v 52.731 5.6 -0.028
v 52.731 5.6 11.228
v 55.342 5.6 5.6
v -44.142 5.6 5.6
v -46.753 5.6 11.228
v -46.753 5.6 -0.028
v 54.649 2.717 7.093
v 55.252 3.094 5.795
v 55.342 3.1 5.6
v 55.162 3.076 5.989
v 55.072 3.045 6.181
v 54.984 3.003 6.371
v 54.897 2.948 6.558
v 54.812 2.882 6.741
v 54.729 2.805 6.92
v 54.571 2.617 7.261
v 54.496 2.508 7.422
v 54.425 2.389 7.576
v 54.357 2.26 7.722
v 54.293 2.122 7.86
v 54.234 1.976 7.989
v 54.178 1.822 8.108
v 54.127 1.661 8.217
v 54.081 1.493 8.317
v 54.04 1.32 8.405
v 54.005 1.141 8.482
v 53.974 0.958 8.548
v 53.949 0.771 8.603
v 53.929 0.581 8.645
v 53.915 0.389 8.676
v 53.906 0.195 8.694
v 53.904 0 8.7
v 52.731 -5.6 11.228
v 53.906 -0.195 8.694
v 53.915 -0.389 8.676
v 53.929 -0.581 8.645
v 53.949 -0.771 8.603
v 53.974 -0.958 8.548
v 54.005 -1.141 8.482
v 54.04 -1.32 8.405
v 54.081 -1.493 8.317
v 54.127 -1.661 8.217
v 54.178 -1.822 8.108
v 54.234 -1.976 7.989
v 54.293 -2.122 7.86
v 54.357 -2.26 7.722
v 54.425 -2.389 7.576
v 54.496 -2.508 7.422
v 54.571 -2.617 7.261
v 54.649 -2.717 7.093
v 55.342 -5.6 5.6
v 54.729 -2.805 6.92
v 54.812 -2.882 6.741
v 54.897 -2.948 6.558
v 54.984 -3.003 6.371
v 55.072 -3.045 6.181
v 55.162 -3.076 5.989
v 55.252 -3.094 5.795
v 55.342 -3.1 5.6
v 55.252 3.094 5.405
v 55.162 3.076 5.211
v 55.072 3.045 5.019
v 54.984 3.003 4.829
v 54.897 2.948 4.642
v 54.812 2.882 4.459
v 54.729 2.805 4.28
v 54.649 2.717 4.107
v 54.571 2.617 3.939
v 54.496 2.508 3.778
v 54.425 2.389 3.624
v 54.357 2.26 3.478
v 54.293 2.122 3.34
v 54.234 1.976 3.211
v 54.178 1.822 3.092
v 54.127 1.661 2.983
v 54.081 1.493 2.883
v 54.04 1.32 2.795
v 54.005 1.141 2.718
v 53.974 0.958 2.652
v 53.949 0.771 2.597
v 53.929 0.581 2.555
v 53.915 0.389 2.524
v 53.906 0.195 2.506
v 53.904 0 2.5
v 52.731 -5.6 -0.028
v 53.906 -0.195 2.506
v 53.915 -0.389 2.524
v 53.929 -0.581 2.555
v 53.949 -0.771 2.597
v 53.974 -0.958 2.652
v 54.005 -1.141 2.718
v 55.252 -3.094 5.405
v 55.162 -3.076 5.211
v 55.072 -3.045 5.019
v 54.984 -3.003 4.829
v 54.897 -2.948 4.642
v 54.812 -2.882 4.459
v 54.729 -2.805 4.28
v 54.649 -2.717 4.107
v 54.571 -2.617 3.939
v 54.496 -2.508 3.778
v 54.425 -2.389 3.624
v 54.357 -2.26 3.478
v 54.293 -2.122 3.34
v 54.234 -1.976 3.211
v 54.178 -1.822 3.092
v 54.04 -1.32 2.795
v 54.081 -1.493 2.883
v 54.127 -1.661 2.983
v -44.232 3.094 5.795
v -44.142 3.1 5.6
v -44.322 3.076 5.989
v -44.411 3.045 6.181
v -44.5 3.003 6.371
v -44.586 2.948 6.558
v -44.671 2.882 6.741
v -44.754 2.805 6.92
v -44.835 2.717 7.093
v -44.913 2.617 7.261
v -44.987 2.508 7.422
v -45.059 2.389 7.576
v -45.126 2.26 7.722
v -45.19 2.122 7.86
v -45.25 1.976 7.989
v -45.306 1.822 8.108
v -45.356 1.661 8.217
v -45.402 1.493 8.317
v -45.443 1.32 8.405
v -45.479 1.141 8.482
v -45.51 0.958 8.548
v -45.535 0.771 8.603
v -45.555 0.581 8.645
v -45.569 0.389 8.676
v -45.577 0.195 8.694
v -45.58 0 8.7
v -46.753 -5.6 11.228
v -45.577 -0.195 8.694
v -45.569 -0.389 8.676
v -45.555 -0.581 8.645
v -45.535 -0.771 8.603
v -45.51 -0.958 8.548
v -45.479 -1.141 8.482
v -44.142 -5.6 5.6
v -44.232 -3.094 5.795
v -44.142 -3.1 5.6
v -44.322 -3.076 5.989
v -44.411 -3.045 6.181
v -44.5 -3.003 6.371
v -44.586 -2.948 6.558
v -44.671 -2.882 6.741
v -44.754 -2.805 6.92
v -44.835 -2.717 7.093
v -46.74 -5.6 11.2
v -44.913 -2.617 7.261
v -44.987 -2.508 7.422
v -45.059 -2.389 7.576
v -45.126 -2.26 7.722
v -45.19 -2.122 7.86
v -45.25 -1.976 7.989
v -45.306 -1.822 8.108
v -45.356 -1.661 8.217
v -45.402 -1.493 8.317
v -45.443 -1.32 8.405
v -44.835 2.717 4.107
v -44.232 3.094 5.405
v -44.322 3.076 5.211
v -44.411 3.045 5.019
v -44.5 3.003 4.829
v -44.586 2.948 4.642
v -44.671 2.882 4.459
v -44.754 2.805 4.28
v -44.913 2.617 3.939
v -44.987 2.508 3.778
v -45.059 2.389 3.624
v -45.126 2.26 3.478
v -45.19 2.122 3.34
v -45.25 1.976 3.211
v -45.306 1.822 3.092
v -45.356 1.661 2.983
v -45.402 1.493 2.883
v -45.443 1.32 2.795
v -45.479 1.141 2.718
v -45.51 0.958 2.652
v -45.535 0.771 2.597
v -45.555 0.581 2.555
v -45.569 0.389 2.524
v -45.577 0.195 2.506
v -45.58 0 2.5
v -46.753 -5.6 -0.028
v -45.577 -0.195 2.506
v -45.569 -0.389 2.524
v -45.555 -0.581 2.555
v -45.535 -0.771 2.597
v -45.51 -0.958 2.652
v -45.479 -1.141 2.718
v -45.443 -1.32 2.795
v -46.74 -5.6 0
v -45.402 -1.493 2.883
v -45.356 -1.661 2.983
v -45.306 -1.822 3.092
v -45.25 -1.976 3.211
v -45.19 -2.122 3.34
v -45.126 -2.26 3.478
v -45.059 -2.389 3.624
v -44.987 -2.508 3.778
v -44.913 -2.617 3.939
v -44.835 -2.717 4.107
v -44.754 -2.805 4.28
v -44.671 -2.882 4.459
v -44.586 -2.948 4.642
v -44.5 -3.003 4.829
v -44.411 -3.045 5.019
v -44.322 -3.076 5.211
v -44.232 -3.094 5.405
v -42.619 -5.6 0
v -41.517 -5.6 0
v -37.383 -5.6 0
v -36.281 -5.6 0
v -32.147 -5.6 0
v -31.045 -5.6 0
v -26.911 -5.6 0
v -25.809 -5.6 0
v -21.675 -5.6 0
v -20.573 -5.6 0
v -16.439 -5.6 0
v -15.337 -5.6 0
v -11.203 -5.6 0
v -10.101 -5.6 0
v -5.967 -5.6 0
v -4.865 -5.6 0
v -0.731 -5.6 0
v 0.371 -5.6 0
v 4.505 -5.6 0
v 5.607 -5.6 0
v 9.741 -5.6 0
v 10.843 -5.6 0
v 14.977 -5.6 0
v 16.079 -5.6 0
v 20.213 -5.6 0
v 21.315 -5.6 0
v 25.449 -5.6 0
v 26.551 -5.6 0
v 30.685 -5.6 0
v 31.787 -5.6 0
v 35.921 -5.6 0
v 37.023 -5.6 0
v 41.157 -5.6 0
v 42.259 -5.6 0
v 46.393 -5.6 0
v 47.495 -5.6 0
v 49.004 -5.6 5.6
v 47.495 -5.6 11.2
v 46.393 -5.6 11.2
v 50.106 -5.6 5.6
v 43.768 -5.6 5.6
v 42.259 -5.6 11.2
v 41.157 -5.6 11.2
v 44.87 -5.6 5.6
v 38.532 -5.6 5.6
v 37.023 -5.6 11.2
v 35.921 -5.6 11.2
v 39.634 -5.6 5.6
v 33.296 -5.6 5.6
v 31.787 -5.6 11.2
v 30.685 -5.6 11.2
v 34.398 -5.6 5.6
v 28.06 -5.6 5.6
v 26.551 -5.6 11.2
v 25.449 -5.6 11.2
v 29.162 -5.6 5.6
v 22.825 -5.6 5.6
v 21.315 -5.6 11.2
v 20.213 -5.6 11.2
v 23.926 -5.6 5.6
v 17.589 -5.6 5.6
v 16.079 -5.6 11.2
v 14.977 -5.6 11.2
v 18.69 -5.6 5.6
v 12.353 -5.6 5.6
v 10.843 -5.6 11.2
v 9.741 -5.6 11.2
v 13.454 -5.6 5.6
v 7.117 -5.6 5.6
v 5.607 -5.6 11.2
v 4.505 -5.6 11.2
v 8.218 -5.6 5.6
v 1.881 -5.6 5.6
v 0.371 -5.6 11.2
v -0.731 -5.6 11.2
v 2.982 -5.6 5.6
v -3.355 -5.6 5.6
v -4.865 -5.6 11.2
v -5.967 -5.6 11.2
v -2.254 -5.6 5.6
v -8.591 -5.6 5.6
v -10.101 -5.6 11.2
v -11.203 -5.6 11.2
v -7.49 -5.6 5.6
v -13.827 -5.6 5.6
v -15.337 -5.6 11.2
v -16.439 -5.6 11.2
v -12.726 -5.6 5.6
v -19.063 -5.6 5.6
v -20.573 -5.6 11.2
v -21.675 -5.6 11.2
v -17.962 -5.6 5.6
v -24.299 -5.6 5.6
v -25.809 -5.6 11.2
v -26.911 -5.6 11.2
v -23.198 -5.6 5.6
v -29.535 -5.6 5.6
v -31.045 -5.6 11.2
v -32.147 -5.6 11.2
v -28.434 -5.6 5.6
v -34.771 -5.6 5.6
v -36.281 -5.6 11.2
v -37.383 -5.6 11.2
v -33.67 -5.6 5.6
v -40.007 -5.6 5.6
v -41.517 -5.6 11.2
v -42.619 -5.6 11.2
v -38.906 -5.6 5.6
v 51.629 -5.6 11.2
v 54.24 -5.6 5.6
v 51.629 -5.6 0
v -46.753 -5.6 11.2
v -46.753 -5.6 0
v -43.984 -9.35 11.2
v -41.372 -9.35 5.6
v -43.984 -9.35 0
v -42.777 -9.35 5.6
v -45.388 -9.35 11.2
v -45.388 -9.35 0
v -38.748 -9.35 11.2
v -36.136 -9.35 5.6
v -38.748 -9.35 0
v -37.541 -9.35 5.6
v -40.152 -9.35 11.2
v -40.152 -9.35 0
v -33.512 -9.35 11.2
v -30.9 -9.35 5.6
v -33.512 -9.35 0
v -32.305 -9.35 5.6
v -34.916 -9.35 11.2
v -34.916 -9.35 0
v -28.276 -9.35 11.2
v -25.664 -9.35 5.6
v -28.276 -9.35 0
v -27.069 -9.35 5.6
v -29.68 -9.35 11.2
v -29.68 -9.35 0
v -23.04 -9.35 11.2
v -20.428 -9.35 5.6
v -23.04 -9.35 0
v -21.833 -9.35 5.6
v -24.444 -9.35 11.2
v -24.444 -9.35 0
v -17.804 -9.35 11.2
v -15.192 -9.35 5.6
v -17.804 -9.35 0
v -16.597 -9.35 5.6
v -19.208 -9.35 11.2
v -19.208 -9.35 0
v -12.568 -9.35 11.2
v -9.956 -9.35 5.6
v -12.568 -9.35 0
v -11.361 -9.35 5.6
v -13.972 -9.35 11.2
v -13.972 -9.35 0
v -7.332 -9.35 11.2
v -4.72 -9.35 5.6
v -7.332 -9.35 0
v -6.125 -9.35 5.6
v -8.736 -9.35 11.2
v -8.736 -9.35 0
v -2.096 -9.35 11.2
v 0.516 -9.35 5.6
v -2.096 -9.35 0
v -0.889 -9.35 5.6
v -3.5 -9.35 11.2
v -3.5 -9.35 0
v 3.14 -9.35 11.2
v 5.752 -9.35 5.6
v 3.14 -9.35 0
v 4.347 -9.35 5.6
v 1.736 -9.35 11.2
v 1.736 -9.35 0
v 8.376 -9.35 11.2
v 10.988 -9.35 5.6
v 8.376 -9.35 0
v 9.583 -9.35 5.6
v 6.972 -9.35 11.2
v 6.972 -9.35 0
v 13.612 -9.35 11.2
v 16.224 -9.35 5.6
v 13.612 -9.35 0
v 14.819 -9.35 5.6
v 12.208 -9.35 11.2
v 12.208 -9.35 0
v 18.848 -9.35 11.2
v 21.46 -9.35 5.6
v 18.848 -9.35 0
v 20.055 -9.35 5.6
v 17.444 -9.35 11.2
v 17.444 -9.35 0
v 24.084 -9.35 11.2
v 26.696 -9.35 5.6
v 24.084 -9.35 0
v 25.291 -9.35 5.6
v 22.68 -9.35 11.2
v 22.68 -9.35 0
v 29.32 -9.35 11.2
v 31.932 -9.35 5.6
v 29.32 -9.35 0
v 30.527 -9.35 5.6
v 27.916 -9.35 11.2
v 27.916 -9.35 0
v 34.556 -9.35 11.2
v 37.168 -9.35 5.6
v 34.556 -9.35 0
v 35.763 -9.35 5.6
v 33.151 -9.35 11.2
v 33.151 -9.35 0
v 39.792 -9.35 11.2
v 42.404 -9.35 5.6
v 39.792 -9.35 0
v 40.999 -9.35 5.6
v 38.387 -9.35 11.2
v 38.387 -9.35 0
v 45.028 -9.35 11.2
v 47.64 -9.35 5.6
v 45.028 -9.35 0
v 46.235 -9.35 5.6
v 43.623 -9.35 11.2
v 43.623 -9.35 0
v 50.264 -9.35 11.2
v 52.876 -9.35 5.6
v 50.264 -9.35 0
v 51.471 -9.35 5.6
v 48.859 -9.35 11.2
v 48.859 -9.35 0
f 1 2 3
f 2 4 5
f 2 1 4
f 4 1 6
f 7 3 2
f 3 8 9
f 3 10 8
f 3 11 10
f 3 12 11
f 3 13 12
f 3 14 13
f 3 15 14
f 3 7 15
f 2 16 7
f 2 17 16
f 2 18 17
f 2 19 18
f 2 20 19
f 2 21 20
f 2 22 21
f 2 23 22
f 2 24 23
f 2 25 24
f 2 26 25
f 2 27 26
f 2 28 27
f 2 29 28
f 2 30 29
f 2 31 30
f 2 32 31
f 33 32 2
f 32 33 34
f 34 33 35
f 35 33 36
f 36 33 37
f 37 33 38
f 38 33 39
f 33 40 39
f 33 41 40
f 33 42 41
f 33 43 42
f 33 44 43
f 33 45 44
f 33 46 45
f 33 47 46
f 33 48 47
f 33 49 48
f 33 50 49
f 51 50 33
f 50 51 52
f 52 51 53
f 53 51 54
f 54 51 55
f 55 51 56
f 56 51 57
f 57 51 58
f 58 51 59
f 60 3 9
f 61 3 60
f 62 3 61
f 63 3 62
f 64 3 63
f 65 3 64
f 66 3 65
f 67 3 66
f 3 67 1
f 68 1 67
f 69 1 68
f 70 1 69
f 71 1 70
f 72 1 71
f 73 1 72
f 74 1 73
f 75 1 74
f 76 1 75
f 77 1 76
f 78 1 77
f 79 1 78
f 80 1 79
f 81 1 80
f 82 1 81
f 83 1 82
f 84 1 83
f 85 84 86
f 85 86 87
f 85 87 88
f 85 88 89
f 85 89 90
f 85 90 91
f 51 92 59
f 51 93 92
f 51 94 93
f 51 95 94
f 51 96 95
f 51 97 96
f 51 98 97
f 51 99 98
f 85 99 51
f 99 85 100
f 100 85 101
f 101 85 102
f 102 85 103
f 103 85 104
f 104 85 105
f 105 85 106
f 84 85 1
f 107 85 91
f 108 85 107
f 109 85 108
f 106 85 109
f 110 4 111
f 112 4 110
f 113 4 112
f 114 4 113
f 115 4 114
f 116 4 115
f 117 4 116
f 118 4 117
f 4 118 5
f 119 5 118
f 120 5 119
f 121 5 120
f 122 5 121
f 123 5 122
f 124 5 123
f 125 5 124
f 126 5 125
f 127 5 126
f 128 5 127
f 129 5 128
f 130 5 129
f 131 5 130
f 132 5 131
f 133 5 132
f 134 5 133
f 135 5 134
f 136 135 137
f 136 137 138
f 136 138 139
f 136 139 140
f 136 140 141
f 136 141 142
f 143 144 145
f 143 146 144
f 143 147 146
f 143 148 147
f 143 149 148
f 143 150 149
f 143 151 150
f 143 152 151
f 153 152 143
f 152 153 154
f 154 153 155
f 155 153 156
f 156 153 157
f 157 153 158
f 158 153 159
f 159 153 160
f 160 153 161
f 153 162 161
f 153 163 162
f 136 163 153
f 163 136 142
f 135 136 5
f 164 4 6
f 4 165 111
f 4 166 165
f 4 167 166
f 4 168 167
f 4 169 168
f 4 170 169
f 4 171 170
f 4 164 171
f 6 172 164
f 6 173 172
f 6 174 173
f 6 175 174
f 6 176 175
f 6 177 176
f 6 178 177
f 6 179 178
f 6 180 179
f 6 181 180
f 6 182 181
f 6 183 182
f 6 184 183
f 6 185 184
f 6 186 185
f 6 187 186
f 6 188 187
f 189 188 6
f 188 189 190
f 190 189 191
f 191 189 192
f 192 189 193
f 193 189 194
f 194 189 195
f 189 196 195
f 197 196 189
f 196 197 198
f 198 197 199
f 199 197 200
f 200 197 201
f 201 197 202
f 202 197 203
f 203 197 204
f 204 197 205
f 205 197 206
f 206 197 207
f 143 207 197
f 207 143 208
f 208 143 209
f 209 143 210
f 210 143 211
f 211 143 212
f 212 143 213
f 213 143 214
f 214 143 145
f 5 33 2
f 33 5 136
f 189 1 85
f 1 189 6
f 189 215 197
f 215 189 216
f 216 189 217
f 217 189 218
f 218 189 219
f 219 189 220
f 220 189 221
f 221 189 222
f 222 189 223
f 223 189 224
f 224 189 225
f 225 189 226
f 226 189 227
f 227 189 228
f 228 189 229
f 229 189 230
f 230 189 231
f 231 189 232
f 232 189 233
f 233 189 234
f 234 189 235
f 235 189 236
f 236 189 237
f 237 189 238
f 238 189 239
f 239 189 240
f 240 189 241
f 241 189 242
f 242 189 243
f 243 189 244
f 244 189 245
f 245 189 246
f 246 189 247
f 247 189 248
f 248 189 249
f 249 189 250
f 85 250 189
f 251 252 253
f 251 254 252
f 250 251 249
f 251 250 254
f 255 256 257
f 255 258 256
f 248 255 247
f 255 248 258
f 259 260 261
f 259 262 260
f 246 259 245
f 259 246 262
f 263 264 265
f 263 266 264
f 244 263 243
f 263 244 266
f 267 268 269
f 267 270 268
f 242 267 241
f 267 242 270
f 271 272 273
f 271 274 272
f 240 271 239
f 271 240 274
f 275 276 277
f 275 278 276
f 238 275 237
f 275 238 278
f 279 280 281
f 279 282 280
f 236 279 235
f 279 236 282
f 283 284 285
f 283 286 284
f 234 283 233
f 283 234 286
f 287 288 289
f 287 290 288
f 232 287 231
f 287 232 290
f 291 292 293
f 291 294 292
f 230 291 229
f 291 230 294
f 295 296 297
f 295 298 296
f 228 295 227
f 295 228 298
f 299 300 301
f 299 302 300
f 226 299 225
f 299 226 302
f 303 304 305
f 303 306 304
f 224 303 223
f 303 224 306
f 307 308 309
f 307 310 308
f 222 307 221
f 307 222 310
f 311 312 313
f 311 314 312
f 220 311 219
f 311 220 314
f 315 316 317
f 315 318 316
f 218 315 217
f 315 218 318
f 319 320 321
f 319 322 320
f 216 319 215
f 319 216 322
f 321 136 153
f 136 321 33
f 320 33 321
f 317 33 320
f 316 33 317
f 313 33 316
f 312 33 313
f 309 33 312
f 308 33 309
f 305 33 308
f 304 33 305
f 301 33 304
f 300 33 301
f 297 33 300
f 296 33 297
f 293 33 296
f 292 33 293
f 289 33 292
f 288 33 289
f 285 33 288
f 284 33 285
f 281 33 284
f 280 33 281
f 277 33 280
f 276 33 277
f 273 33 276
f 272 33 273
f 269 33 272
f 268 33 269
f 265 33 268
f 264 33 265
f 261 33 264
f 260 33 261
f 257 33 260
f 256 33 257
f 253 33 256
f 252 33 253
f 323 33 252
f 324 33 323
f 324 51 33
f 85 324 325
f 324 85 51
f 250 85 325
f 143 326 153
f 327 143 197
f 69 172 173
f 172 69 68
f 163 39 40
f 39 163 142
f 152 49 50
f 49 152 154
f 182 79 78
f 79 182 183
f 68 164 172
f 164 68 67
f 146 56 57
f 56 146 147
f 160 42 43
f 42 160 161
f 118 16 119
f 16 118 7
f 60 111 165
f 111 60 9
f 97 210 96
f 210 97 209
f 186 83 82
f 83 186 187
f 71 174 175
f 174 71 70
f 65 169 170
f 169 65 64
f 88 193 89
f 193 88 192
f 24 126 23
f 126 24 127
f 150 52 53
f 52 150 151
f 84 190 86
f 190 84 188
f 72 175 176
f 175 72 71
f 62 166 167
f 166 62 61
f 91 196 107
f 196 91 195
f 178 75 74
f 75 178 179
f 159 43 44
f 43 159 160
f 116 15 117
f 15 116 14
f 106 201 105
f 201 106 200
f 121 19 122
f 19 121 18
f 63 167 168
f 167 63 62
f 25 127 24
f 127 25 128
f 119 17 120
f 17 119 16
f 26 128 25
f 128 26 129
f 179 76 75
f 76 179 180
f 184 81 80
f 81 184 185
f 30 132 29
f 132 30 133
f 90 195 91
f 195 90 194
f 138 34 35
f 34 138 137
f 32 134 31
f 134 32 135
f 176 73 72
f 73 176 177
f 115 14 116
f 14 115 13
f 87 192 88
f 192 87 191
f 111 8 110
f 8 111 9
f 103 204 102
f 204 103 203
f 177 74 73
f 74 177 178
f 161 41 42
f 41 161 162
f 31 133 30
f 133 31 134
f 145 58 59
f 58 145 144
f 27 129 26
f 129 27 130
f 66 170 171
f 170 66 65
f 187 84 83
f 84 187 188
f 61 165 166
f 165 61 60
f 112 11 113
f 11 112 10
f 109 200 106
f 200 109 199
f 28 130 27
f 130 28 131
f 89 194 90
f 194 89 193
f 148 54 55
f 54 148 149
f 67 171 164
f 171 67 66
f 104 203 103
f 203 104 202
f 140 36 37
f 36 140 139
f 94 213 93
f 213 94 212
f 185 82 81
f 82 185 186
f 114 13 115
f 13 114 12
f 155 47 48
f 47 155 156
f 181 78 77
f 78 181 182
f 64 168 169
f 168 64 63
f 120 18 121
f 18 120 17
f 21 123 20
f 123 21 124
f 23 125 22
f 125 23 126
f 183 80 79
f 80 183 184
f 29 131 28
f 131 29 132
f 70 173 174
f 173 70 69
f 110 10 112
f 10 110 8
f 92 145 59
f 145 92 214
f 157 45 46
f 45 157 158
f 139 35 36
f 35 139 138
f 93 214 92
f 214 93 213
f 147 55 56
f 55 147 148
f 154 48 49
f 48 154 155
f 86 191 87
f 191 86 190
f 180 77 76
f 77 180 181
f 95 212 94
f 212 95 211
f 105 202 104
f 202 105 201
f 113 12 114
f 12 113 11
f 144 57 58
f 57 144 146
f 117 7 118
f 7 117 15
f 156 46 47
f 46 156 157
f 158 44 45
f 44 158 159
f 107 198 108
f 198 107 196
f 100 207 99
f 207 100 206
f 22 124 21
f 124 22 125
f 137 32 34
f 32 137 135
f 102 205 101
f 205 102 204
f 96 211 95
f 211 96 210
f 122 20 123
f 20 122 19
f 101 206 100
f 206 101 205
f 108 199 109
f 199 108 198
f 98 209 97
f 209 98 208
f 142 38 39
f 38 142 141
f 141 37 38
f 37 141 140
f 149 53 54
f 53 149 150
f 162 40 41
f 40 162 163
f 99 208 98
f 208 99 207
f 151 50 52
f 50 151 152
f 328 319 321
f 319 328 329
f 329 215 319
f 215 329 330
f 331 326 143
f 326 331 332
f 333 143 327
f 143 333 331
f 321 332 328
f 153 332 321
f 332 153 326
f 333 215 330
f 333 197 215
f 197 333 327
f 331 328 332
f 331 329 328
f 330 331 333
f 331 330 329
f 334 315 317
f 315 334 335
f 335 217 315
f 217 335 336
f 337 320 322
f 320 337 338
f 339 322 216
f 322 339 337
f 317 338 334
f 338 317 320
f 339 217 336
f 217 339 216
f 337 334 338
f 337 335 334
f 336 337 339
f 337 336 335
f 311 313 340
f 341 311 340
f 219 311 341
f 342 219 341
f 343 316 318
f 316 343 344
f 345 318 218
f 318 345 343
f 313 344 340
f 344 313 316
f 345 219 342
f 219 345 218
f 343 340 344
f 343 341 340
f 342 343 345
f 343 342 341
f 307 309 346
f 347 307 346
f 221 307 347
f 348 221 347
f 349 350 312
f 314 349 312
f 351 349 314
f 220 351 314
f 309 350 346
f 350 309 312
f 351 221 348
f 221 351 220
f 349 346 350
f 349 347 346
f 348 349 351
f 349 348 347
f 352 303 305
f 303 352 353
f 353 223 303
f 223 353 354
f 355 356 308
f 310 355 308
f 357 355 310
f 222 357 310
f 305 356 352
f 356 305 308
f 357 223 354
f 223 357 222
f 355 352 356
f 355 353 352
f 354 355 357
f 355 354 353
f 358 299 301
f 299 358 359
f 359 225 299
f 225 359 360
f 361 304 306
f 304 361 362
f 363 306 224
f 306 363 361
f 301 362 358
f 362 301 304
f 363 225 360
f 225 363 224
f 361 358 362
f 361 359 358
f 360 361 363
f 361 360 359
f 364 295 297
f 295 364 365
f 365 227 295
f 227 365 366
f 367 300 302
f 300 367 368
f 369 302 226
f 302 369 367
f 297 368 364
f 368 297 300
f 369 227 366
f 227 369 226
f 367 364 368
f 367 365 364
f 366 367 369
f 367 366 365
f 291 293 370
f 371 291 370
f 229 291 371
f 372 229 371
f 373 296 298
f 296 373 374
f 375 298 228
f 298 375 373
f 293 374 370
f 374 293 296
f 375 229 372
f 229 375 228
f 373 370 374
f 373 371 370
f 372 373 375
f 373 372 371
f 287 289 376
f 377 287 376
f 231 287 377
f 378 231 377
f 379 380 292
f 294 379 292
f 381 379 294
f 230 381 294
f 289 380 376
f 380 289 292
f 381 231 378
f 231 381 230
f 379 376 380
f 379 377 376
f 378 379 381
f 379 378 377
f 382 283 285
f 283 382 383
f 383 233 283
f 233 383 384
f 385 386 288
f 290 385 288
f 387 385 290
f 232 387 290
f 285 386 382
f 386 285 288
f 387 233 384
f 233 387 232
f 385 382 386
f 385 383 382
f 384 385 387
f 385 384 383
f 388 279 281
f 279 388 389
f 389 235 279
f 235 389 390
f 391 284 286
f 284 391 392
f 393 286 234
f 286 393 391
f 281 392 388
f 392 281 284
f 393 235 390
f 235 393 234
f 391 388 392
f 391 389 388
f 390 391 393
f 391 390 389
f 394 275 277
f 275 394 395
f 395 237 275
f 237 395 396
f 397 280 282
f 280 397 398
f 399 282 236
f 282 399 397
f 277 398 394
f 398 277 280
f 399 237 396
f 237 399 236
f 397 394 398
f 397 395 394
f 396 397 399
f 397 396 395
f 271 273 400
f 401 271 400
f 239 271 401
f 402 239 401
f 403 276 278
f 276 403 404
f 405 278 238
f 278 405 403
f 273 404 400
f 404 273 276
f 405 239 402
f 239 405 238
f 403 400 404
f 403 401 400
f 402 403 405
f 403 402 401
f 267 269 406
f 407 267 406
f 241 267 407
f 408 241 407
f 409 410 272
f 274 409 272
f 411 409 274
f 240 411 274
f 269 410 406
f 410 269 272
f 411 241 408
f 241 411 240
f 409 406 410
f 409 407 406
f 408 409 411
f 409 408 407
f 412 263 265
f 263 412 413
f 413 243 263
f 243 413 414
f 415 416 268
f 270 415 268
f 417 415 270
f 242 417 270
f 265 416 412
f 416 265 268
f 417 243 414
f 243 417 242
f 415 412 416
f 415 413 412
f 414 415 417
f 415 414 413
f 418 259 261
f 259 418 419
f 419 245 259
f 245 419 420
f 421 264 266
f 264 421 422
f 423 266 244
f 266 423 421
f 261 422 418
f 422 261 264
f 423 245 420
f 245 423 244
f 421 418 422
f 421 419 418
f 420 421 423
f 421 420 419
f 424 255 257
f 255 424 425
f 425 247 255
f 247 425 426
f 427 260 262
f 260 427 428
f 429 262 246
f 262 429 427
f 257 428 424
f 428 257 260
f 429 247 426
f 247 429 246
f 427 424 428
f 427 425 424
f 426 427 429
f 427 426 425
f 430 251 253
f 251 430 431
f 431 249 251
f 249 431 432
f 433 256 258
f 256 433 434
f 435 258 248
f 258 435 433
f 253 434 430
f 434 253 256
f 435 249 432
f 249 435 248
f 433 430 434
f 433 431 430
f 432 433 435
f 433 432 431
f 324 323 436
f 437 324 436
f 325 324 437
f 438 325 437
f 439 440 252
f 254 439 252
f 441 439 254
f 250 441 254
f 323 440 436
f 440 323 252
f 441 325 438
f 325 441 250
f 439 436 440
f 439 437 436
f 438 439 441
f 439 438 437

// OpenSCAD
// Parametric Modular Rack Mark "Ckaos" Moissette
//Based on the work of MattMoses and Fdavies :
//http://forums.reprap.org/read.php?1,51452,52099#msg-52099
//and Forrest Higgs:
// http://technocraticanarchist.blogspot.com/2010/01/high-speed-alternative-to-belts.html
//It is licensed under the Creative Commons - GNU GPL license.
// © 2011 by Mark "Ckaos" Moissette
//more info at :www.kaosat.net and
//http://www.thingiverse.com/thing:6011



pi=3.1415926535897932384626433832795;
innerRadius=3.1;//shaft radius, in mm
borders=2.5;//how thick should the borders around the central "shaft" be, in mm
diametralPitch=12;
numberOfTeeth=19;
pressureAngle=20*pi/180;
centerAngle=25;//angle at center of teeth


//example usage
rack(innerRadius,borders,diametralPitch,numberOfTeeth,pressureAngle,centerAngle);



module rack(innerRadius,borders,P,N,PA,CA)
{
	// P = diametral pitch
	// N = number of teeth
	// PA = pressure angle in radians
	// x, y = linear offset distances
	a = 1/P; // addendum (also known as "module")
	d = 1.25/P; // dedendum (this is set by a standard)
	multiplier=20;//20
	height=(d+a)*multiplier;
	
	
	// find the tangent of pressure angle once
	tanPA = tan(PA*(180/pi));
	// length of bottom and top horizontal segments of tooth profile
	botL = (pi/P/2 - 2*d*tanPA)*multiplier;
	topL =( pi/P/2 - 2*a*tanPA)*multiplier;

	slantLng=tanPA*height;
	realBase=2*slantLng+topL;
	
	
	offset=topL+botL+2*slantLng;
	length=(realBase+botL)*N;

	supportSize=(innerRadius+borders)*2;

	//calculate tooth params
	basesegmentL=realBase/2;
	basesegmentW=supportSize/2;

	topsegmentL=topL/2;
	topsegmentW=supportSize/2;

	baseoffsetY=tan(CA)*basesegmentW;
	topoffsetY=tan(CA)*topsegmentW;
	
	//calculate support params

	totalSupportLength=(N)*(offset);
	supportL=totalSupportLength/2;
	supportW=supportSize/1.99;
	
	echo("Total length",totalSupportLength+baseoffsetY);
	echo("Total height",supportSize);

	
	rotate([90,90,0])
	{
	translate([-supportSize/2,supportSize/2,0])
	{
	union()
	{
		difference()
		{
			support(supportL,supportW,supportSize,baseoffsetY);
			rotate([90,90,0]) 
			{cylinder(h=length+10,r=innerRadius,center=true,$fn=100);}
		}

	
		for (i = [0:N-1]) 
		{
			translate([0,i*offset-length/2+realBase/2,supportSize/2+height/2]) 
			{	
				
				tooth(basesegmentL,basesegmentW,topsegmentL,topsegmentW,height,baseoffsetY,topoffsetY);
				
			}
		}
	}
	
	}
	}
}

module support(supportL,supportW,height,offsetY)
{
	 tooth(supportL,supportW,supportL,supportW,height,offsetY,offsetY);
}



module tooth(basesegmentL,basesegmentW,topsegmentL,topsegmentW,height,baseoffsetY,topoffsetY)//top : width*length, same for base
{
	
	////////////////
	basePT1=[
	-basesegmentW,
	basesegmentL-baseoffsetY,
	-height/2];

	basePT2=[
	0,
	basesegmentL,
	-height/2];

	basePT3=[
	basesegmentW,
	basesegmentL-baseoffsetY,
	-height/2];

	basePT4=[
	basesegmentW,
	basesegmentL-(baseoffsetY+basesegmentL*2),
	-height/2];
	
	basePT5=[
	0,
	-basesegmentL,
	-height/2];

	basePT6=[
	-basesegmentW,
	basesegmentL-(baseoffsetY+basesegmentL*2),
	-height/2];
	//////////////////////////
	topPT1=[
	-topsegmentW,
	topsegmentL-topoffsetY,
	height/2];

	topPT2=[
	0,
	topsegmentL,
	height/2];

	topPT3=[
	topsegmentW,
	topsegmentL-topoffsetY,
	height/2];

	topPT4=[
	topsegmentW,
	topsegmentL-(topoffsetY+topsegmentL*2),
	height/2];
	
	topPT5=[
	0,
	-topsegmentL,
	height/2];

	topPT6=[
	-topsegmentW,
	topsegmentL-(topoffsetY+topsegmentL*2),
	height/2];
	//////////////////////////

	//////////////////////////

	polyhedron(
	points=[
		basePT1,
		basePT2,
		basePT3,
		basePT4,
		basePT5,
		basePT6,
		topPT1,
		topPT2,
		topPT3,
		topPT4,
		topPT5,
		topPT6],
	triangles=[
	//base
	[5,1,0],
	[4,1,5],
	[4,2,1],
	[3,2,4],	

	//front
	[1,6,0],
	[7,6,1],
	[2,7,1],
	[8,7,2],
	//back
	[11,10,5],
	[5,10,4],
	[10,9,4],
	[4,9,3],	
	//side 1
	[0,11,5],
	[6,11,0],
	//side 2
	[3,8,2],
	[9,8,3],
	//top
	[9,10,8],
	[10,7,8],
	[11,7,10],
	[6,7,11],
	]
	);
}

module demo_gear(position,diametralPitch)
{
	wheelSize=12;
rotate([0,90,180])
translate(position)

{
gear (
	number_of_teeth=8,
	circular_pitch=300, 
	pressure_angle=19.34,
	gear_thickness=wheelSize/2,
	rim_thickness=wheelSize/2,
	hub_thickness=0,
	bore_diameter=2,
	backlash=0,twist=centerAngle,involute_facets=15);

translate([0,0,wheelSize/2])
rotate([0,0,-centerAngle])
gear (
	number_of_teeth=8,
	circular_pitch=300, 
	pressure_angle=19.34,
	gear_thickness=wheelSize/2,
	rim_thickness=wheelSize/2,
	hub_thickness=0,
	bore_diameter=2,
	backlash=0,twist=-centerAngle,involute_facets=15);

}

}
